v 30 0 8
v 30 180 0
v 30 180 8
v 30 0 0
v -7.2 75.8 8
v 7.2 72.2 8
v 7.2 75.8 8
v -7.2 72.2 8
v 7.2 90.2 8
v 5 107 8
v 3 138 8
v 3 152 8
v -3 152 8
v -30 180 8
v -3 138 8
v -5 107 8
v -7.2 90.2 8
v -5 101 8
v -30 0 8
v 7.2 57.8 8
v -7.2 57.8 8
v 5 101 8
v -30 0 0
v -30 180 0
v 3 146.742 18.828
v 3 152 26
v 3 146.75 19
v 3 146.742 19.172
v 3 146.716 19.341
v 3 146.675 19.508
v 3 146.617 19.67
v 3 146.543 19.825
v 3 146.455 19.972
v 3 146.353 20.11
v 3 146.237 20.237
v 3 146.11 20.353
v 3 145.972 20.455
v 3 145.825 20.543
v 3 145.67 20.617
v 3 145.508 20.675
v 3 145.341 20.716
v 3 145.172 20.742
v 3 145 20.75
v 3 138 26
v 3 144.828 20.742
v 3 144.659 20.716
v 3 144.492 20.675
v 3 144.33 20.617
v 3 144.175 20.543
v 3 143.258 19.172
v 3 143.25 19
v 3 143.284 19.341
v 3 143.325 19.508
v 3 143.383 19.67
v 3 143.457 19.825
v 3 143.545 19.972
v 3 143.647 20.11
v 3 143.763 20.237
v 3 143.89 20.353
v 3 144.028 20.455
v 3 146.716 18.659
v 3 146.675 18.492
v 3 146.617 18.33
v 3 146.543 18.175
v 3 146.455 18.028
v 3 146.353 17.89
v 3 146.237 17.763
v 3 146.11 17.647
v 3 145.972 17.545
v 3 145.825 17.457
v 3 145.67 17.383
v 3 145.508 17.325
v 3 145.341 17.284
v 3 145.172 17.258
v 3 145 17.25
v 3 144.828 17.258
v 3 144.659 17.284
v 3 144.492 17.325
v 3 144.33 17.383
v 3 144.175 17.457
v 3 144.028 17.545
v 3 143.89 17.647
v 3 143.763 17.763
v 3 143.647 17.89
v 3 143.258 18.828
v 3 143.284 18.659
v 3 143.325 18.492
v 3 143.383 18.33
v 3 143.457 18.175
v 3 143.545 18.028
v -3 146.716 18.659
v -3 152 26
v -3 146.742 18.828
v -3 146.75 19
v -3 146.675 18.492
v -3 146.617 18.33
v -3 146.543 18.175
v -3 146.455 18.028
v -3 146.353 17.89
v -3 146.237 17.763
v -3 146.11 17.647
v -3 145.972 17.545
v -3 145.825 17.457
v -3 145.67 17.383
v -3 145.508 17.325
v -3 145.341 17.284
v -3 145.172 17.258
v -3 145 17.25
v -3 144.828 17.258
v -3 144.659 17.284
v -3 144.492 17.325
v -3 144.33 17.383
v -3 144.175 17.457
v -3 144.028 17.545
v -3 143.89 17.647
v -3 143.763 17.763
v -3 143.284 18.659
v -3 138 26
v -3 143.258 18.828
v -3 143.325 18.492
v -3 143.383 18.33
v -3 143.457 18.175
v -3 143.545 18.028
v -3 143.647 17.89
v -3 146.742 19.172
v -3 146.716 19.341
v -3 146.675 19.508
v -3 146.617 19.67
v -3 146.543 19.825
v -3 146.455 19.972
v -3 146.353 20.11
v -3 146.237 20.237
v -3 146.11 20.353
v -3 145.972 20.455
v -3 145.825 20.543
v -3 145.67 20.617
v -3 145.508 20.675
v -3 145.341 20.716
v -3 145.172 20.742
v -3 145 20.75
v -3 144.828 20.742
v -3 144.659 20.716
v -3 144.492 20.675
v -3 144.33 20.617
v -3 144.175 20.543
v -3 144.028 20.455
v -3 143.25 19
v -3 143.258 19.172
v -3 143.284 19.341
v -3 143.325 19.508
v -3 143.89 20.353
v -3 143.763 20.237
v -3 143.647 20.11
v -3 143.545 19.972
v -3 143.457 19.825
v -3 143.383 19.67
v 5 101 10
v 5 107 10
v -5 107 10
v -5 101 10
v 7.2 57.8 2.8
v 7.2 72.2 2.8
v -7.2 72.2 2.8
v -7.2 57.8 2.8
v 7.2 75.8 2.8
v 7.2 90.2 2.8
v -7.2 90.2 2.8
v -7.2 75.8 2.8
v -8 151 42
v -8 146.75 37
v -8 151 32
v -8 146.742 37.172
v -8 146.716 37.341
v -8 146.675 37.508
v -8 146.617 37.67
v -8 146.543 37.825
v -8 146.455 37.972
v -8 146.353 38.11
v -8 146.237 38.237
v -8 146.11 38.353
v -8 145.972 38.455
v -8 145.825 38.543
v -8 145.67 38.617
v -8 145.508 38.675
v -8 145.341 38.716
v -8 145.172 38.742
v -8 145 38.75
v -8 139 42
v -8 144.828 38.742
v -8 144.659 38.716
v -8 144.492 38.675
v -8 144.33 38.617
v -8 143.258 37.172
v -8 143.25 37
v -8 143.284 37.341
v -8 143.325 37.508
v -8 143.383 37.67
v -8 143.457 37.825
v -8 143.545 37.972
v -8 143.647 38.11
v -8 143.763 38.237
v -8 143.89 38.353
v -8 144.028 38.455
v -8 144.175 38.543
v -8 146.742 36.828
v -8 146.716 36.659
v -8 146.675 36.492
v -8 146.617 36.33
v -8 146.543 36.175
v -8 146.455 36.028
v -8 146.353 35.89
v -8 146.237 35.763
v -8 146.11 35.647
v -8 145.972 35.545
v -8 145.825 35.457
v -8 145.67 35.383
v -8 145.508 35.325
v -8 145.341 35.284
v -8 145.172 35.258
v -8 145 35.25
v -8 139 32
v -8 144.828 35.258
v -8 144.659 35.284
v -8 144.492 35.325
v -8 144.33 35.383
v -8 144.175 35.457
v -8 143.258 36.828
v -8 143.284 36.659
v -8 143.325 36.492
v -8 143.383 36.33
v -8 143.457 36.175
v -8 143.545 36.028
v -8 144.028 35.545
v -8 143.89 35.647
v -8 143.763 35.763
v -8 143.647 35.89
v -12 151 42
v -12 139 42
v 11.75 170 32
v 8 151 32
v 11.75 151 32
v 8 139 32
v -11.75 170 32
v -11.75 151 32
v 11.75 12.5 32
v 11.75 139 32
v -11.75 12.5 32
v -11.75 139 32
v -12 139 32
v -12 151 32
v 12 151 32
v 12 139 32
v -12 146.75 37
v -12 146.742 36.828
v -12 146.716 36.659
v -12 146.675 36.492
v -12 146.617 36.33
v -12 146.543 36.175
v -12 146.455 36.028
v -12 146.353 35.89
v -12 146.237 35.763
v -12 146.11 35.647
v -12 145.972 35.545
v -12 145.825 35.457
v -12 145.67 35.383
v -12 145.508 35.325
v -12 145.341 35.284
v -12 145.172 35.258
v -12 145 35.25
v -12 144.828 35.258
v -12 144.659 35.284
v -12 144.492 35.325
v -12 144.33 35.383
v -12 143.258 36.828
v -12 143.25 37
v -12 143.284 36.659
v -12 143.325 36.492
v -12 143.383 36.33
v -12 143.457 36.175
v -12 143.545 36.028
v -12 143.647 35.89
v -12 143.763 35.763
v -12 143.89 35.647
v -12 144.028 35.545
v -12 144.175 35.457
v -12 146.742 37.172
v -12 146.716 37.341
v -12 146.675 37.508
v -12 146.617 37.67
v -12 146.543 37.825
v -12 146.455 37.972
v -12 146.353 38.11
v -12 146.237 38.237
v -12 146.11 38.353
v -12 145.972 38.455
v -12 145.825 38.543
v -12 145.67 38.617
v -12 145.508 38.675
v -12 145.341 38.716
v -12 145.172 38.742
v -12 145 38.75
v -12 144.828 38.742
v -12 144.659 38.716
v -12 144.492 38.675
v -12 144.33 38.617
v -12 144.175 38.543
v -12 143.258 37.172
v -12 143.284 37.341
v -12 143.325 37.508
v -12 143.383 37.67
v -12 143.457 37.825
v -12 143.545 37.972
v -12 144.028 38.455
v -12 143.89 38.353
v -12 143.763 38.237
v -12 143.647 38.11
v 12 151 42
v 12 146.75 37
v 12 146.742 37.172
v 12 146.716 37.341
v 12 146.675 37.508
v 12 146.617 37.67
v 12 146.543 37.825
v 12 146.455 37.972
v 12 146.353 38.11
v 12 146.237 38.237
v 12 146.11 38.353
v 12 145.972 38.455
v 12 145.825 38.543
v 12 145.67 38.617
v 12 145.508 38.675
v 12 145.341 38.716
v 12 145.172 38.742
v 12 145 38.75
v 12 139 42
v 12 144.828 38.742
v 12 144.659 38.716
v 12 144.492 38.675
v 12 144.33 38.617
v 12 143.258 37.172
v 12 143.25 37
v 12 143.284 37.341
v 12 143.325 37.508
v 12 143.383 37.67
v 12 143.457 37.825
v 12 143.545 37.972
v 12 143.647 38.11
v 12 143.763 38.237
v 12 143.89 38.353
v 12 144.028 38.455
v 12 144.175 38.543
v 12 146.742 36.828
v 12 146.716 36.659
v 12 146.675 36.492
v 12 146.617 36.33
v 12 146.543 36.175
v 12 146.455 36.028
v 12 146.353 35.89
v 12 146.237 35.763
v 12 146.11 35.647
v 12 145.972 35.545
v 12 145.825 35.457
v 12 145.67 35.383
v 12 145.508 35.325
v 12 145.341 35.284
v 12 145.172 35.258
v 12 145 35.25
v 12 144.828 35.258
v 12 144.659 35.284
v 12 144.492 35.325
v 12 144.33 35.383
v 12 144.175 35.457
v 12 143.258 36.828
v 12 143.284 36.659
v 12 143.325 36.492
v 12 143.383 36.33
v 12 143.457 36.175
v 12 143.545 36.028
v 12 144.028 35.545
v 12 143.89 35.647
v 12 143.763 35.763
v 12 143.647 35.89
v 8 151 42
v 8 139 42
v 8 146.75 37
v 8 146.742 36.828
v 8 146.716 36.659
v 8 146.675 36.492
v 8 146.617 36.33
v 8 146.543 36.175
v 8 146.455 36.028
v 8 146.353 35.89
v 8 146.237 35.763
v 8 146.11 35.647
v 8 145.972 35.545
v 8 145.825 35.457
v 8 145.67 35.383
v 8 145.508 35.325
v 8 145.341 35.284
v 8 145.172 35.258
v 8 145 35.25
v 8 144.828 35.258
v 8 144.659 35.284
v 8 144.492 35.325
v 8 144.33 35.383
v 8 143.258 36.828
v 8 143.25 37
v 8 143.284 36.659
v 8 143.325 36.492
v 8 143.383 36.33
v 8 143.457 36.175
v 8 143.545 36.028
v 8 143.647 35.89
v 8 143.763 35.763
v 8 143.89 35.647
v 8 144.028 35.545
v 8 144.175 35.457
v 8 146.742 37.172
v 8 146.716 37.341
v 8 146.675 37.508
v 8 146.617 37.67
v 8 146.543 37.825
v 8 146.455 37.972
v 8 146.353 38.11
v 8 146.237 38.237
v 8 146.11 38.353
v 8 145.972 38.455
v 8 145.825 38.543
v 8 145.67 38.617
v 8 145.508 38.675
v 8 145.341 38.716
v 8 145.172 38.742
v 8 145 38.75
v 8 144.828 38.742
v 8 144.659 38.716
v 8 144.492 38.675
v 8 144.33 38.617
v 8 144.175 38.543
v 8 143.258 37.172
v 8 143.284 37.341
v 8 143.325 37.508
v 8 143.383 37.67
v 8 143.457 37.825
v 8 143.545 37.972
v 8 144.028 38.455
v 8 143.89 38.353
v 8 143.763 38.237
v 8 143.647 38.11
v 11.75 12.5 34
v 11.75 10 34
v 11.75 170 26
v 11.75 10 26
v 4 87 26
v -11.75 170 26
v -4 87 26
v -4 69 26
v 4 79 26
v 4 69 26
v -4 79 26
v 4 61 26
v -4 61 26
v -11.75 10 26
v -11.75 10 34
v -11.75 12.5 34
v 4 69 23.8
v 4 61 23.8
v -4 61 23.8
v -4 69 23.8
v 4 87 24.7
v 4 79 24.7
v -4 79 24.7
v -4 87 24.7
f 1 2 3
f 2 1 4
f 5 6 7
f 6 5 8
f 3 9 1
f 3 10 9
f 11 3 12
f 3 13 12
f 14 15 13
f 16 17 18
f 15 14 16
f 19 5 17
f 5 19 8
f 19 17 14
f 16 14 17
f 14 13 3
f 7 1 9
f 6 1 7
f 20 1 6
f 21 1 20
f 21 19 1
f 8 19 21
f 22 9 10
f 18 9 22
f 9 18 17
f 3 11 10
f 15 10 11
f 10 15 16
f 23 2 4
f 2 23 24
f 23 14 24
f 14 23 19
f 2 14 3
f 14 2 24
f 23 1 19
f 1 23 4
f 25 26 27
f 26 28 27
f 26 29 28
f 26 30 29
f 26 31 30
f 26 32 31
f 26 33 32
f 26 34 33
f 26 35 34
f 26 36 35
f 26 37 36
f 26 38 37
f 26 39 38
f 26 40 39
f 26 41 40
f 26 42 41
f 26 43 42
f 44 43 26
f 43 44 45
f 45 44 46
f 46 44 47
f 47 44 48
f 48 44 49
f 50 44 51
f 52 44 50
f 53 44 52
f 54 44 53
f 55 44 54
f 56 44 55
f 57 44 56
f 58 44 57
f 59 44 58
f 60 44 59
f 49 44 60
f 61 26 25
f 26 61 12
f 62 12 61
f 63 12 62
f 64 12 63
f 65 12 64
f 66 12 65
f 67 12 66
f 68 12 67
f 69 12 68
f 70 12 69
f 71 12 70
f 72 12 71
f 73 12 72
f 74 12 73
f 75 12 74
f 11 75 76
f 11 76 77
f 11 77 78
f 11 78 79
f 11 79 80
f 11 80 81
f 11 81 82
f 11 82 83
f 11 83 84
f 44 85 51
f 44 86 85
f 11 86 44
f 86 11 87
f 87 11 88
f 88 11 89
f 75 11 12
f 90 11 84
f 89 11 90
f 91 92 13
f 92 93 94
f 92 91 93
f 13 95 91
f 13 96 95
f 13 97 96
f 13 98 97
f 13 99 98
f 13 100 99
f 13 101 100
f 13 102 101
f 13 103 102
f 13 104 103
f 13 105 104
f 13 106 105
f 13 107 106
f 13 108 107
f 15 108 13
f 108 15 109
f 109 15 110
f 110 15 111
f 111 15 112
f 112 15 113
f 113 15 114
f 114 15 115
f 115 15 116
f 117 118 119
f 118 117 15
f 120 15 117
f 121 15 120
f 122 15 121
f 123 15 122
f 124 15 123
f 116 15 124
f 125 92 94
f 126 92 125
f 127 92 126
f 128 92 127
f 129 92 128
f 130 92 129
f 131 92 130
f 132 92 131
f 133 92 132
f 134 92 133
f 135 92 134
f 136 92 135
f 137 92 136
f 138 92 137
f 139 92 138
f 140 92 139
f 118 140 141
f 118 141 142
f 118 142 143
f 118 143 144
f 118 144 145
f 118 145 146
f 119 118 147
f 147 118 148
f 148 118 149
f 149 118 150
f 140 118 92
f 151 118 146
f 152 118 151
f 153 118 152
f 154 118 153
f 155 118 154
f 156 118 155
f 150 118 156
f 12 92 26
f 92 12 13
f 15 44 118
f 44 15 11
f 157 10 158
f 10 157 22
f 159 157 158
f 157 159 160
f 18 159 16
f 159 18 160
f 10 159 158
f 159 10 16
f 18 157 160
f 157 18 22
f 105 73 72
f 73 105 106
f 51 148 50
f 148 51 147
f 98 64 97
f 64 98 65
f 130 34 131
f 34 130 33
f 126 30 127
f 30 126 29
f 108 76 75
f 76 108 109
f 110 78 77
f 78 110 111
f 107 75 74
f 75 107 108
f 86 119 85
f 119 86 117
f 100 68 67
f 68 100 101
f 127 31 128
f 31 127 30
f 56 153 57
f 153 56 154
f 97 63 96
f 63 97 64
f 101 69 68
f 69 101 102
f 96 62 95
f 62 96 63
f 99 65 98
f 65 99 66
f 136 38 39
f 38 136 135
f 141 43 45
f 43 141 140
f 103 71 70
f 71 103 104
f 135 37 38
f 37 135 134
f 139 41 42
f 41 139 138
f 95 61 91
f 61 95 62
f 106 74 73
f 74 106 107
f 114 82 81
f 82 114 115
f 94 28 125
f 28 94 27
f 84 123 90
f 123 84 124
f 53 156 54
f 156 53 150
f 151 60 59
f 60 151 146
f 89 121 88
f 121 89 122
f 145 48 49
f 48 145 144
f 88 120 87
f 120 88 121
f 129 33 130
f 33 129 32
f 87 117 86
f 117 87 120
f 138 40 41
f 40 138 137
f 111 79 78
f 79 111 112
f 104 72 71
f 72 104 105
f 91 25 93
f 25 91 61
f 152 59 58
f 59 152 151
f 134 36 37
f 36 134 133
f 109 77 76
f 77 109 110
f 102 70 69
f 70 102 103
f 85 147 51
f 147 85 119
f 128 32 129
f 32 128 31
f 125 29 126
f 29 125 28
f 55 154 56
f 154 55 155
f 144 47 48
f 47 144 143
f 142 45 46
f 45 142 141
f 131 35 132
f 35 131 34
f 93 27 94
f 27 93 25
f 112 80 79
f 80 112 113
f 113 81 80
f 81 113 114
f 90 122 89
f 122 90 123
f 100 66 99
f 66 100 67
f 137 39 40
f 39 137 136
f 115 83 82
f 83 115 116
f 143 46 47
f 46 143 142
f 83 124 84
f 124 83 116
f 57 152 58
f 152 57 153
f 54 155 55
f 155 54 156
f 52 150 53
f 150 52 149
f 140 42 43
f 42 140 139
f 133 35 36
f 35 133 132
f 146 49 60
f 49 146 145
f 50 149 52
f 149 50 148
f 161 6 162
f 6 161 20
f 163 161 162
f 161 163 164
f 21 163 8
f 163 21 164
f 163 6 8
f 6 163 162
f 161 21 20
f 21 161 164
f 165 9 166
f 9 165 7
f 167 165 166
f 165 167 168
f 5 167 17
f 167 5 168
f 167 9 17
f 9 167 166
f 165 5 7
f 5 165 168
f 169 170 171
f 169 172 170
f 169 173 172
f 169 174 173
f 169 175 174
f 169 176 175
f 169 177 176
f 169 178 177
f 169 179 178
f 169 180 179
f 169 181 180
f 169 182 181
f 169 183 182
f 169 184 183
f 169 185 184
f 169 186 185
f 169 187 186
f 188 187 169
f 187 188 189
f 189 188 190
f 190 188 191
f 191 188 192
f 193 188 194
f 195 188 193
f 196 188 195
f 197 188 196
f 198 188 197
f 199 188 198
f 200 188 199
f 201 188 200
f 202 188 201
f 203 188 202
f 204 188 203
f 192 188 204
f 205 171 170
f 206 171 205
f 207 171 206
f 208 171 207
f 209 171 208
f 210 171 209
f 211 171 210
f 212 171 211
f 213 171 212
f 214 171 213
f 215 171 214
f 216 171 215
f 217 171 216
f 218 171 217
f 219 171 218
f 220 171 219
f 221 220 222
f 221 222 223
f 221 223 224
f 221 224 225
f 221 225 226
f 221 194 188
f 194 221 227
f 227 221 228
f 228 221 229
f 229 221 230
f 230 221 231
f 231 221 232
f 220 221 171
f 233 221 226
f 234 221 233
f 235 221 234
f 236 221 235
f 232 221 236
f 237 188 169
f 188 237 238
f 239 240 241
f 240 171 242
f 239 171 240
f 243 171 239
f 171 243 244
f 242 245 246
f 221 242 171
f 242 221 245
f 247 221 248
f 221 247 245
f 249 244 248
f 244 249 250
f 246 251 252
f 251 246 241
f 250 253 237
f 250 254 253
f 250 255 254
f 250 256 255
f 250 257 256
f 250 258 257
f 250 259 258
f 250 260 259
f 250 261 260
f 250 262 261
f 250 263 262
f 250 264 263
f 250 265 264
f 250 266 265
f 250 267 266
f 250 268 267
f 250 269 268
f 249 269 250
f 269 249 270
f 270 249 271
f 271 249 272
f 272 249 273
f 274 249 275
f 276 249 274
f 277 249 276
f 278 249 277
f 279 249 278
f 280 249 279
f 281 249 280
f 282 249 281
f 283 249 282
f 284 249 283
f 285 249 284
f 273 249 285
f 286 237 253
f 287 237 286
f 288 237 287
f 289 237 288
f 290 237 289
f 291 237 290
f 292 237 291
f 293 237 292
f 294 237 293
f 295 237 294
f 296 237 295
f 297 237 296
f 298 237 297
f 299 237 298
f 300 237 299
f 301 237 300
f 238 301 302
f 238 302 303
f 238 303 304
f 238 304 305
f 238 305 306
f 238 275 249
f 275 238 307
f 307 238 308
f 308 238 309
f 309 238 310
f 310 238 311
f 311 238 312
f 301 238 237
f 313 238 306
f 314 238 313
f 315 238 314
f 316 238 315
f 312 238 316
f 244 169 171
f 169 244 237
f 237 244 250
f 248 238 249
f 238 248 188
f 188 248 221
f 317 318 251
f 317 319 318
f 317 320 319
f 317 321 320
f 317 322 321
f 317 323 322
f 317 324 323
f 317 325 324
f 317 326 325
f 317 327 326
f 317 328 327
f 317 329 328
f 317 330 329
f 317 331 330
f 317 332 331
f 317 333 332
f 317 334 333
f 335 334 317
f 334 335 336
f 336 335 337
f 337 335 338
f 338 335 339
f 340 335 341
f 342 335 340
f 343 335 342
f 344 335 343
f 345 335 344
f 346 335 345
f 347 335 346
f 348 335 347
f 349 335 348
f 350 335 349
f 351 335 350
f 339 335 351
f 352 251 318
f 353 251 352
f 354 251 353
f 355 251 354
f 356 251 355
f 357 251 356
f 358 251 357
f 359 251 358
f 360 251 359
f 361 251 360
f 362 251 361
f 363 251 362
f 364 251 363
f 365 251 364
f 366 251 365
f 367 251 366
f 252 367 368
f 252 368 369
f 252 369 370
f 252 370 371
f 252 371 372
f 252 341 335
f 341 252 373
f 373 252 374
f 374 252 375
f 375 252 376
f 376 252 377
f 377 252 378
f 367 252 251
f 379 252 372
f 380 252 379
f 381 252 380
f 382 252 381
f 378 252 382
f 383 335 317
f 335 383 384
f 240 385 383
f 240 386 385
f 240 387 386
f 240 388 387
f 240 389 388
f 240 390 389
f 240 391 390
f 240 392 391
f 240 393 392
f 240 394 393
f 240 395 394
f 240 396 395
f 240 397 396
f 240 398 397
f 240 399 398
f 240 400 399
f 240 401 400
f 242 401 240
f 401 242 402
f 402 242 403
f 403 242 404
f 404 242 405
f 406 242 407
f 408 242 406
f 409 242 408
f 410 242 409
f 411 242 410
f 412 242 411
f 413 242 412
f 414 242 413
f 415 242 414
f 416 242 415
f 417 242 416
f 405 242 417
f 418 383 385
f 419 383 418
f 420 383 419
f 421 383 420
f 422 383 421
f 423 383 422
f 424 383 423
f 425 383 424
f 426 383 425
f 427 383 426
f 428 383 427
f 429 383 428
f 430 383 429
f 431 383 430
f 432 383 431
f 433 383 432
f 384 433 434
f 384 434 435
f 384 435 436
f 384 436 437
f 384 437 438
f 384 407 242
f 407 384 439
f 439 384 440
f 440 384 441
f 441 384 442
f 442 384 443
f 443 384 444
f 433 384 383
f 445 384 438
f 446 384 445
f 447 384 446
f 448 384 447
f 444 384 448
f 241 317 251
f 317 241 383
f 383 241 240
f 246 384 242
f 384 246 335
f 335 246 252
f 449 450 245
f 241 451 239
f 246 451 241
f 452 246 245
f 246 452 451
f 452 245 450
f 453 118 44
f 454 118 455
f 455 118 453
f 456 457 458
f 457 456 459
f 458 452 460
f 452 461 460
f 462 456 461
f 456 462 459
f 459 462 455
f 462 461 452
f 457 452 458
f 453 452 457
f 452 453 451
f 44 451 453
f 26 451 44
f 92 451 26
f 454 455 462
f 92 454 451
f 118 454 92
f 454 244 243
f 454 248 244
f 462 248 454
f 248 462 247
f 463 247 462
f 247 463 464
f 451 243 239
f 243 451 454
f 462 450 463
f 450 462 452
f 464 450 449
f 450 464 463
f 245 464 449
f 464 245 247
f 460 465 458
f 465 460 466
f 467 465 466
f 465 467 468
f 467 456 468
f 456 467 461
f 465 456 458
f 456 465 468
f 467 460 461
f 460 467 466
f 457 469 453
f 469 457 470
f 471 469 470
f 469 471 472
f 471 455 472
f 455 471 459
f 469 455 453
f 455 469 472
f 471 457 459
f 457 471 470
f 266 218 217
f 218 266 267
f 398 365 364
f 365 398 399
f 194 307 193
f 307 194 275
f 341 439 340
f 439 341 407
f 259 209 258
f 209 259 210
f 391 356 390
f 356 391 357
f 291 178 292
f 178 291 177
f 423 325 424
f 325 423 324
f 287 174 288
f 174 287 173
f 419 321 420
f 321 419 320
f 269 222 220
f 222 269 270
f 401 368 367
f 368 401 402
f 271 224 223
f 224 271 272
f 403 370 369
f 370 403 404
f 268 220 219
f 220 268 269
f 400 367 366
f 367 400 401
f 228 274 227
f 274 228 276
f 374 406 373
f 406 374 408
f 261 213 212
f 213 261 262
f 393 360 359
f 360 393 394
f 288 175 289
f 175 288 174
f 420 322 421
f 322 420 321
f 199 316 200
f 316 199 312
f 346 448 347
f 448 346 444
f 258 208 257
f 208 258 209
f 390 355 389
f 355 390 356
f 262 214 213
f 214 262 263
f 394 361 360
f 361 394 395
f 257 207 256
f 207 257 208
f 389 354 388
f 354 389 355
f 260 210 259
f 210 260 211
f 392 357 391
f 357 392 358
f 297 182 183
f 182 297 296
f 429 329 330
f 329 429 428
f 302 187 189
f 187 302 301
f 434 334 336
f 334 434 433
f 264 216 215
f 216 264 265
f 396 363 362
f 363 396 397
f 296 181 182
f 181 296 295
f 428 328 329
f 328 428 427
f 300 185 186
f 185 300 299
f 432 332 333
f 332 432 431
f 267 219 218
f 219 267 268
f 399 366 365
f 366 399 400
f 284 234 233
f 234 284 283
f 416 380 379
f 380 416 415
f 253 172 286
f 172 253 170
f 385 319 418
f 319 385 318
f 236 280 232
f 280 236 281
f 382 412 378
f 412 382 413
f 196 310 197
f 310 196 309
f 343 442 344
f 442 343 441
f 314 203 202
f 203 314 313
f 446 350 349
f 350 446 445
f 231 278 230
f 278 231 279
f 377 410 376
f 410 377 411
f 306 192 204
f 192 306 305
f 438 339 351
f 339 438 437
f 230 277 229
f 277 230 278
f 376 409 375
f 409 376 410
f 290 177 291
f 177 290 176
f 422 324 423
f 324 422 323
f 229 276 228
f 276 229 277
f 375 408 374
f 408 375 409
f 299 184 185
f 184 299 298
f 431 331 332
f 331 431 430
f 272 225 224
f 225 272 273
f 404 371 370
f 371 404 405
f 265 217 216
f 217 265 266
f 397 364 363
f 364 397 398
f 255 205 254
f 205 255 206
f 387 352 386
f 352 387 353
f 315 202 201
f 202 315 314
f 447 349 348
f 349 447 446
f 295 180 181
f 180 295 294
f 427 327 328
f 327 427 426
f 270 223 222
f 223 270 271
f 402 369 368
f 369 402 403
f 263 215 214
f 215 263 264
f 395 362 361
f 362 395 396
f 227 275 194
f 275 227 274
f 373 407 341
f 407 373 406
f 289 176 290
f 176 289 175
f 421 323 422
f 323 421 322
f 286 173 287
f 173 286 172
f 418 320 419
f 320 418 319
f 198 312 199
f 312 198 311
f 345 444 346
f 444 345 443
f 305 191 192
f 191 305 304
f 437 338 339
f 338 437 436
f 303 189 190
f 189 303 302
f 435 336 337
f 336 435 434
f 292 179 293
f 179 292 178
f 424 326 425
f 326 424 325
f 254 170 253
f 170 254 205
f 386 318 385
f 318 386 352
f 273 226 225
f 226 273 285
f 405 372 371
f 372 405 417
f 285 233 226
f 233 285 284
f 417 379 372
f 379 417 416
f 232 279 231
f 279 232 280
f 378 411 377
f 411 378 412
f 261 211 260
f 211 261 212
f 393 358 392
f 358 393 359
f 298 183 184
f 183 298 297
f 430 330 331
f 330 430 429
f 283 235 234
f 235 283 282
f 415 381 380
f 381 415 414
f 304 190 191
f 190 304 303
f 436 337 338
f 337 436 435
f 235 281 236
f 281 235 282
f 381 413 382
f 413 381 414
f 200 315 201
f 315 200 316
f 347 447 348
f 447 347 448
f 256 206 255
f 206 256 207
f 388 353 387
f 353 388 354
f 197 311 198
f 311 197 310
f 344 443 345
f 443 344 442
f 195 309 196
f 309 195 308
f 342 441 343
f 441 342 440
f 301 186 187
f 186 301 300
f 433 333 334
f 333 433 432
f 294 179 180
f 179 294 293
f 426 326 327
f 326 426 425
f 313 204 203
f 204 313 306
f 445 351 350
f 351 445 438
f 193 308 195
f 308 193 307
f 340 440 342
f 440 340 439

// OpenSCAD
/*
  1-key (piano-like hinge) + 2 MX switches on symmetry axis (X=0)
  Both switches trigger on DOWNSTROKE (key rotates about rear axis).

  Parts:
    key_hinged(): long key with hinge ears (M3 rod / screw axis)
    base_hinged(): base with hinge towers + 2 MX pockets centered (X=0), separated along Y

  Units: mm
*/

$fn = 64;

// ---------------- VIEW ----------------
show_key  = true;
show_base = true;
explode_z = 18; // separation for preview

// ---------------- KEY (hinged) ----------------
key_len = 160;      // longer, closer to piano feel
key_w   = 23.5;
key_t   = 6;

front_lip_h = 2.0;  // small front lip
front_lip_len = 2.5;

// Hinge axis position (distance from front edge)
hinge_y = 135;      // far from press point (piano-like)
hinge_axis_d = 3.0; // M3 rod/screw
hinge_clear = 0.25; // clearance in hinge hole
hinge_hole_d = hinge_axis_d + 2*hinge_clear;

// Hinge ears geometry on the key
ear_thick = 4.0;    // thickness along X
ear_len_y = 12.0;   // length along Y around hinge
ear_h = 10.0;       // height above key (ears stick upward)
ear_gap = 6.0;      // gap between ears (base tower sits between)
ear_outer_offset = 10.0; // half-distance of ears from center (X)

// Key underside "contact pads" that press switch stems (optional but helpful)
// You can also omit pads and let the flat key hit stems; pads help ensure contact point.
pad_size = 8.0;
padA_h = 2.2;       // pad height (downwards)
pad_delta = 0.9;    // B later => B pad shorter (downwards)
padB_h = padA_h - pad_delta;

// Switch Y positions (on symmetry axis X=0)
swA_y = 55;         // closer to front
swB_y = 73;         // further back (later in rotation if pads equal)
                     // NOTE: if you also use pad_delta, you get extra timing separation

// ---------------- BASE ----------------
base_margin = 10;
base_t = 8;

base_len = key_len + base_margin*2;
base_w = 60;        // enough for hinge towers + stability

// Hinge towers on base
tower_w = ear_gap;      // tower thickness along X (fits between ears)
tower_len_y = 14.0;     // tower depth along Y
tower_h = 22.0;         // tower height above base
tower_y = hinge_y + base_margin;  // base Y position for hinge (shifted by margin)

// MX pocket (simplified)
mx_body_w = 14.4;
mx_body_h = 14.4;
mx_pocket_depth = 5.2;

// Vertical placement of switches: pockets are cut into base top.
sw_pocket_z = base_t - mx_pocket_depth;

// Optional: travel stop (so key doesn't over-crush switches)
stops_enable = true;
stop_h = 2.0;
stop_w = 10.0;
stop_len = 6.0;
stop_y = swB_y + base_margin + 18; // behind switches

// ---------------- ASSEMBLY PREVIEW ----------------
if (show_base) base_hinged();
if (show_key)  translate([0, base_margin, base_t + explode_z]) key_hinged(); 
// ^ key is shifted in Y by base_margin so front aligns with base front margin

// ================= KEY =================
module key_hinged() {
  assert(padB_h > 0, "padB_h must be > 0. Reduce pad_delta or increase padA_h.");

  difference() {
    union() {
      // Main key slab
      translate([-key_w/2, 0, 0])
        cube([key_w, key_len, key_t], center=false);

      // Front lip
      translate([-key_w/2, 0, key_t])
        cube([key_w, front_lip_len, front_lip_h], center=false);

      // Hinge ears (two)
      for (sx = [-1, 1]) {
        translate([sx*ear_outer_offset - ear_thick/2, hinge_y - ear_len_y/2, key_t])
          cube([ear_thick, ear_len_y, ear_h], center=false);
      }

      // Optional underside pads centered on X=0 at swA_y and swB_y
      // Pads go DOWN (negative Z) to concentrate force on stems.
      // A pad taller, B pad shorter -> B triggers later in the same downstroke.
      translate([-pad_size/2, swA_y - pad_size/2, -padA_h])
        cube([pad_size, pad_size, padA_h], center=false);

      translate([-pad_size/2, swB_y - pad_size/2, -padB_h])
        cube([pad_size, pad_size, padB_h], center=false);
    }

    // Hinge holes through both ears (X direction)
    // We drill a cylinder across X through each ear volume.
    // Make a long cylinder and let it intersect both ears.
    translate([0, hinge_y, key_t + ear_h/2])
      rotate([0,90,0])
        cylinder(d=hinge_hole_d, h=2*ear_outer_offset + 2*ear_thick + 10, center=true);
  }
}

// ================= BASE =================
module base_hinged() {
  difference() {
    union() {
      // Base plate
      translate([-base_w/2, 0, 0])
        cube([base_w, base_len, base_t], center=false);

      // Hinge tower (between ears)
      translate([-tower_w/2, tower_y - tower_len_y/2, base_t])
        cube([tower_w, tower_len_y, tower_h], center=false);

      // Optional stops (key should hit stops instead of crushing stems too hard)
      if (stops_enable) {
        translate([-stop_w/2, stop_y, base_t])
          cube([stop_w, stop_len, stop_h], center=false);
      }
    }

    // Hinge axis hole through tower (X direction)
    translate([0, tower_y, base_t + tower_h/2])
      rotate([0,90,0])
        cylinder(d=hinge_hole_d, h=base_w + 20, center=true);

    // MX pockets centered on X=0 at swA_y and swB_y (shifted by base_margin)
    translate([-mx_body_w/2, (swA_y + base_margin) - mx_body_h/2, sw_pocket_z])
      cube([mx_body_w, mx_body_h, mx_pocket_depth + 0.3], center=false);

    translate([-mx_body_w/2, (swB_y + base_margin) - mx_body_h/2, sw_pocket_z])
      cube([mx_body_w, mx_body_h, mx_pocket_depth + 0.3], center=false);
  }

  // Visual markers (comment out if not needed)
  //switch_markers();
}

module switch_markers() {
  color([0.2,0.2,0.2,0.25])
  for (yy=[swA_y, swB_y]) {
    translate([0, yy + base_margin, base_t])
      cylinder(d=6, h=2);
  }
}
